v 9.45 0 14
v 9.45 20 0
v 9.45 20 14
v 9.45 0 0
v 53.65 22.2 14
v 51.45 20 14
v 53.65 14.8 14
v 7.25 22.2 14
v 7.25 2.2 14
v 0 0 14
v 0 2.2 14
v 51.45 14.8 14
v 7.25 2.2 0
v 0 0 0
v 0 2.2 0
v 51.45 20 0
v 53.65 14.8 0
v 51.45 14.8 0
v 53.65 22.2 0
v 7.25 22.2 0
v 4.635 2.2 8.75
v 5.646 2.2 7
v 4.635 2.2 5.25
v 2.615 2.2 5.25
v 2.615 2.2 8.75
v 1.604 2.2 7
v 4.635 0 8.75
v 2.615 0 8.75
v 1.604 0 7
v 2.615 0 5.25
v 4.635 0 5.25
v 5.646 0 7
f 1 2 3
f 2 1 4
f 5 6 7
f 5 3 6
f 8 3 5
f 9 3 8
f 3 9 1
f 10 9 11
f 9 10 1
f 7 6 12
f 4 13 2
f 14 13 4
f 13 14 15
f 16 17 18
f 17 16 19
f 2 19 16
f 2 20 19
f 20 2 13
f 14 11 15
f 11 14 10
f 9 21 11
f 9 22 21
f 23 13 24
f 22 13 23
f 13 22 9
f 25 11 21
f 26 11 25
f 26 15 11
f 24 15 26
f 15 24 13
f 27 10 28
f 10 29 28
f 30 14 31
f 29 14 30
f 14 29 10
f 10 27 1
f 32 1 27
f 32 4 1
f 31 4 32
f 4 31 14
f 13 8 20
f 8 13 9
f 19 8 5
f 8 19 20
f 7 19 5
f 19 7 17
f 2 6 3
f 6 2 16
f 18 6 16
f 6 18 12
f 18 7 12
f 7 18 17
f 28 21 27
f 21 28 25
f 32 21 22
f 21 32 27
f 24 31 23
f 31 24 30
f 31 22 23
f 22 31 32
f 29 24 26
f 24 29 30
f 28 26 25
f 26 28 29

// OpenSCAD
thickness=2.2;		//material thickness
top=42; 				//inside mesurement of top surface
height=20;			//inside measurement of height
width=14;			//width of bracket
twoscrews=false;	//screw on one side only if false
screw=3.5;			//diameter of screw hole
matlabs=false;		//prints pads to improve bed adhesion if matlabs=true
t_abspads=0.5;		//thickness abs pads
r_abspads=4;		//radius abs pads

flange=1.5*screw+thickness+2;


module frame()
{
cube([flange,thickness,width]);
translate ([flange-thickness,0,0]) cube([thickness,height+thickness,width]);
translate ([flange-thickness,height,0]) cube([top+2*thickness,thickness,width]);

if (twoscrews==true)
{
translate ([flange+top,0,0]) cube([thickness,height+thickness,width]);
translate ([flange+top,0,0]) cube([flange,thickness,width]);
}
else
translate ([flange+top,(height+thickness)/3*2,0]) cube([thickness,(height+thickness)/3,width]);


if (matlabs==true)
{
translate([0,thickness/2,0]) cylinder(t_abspads,r_abspads,r_abspads,$fn=60);
translate([flange-thickness,height+thickness/2,0]) cylinder(t_abspads,r_abspads,r_abspads,$fn=60);
translate([flange+top+thickness,height+thickness/2,0]) cylinder(t_abspads,r_abspads,r_abspads,$fn=60);
if (twoscrews==true)
translate([2*flange+top,thickness/2,0]) cylinder(t_abspads,r_abspads,r_abspads,$fn=60);
else
translate([flange+top+thickness/2,(height+thickness)/3*2,0]) cylinder(t_abspads,r_abspads,r_abspads,$fn=60);
}
}

module holes()
{
//hex holes will be undersized by cos(180/6) hence compensation included
translate ([(flange-thickness)/2,-0.1,width/2]) rotate([-90,0,0]) cylinder (thickness+0.2,screw/cos(180/6)/2,screw/cos(180/6)/2,$fn=6);
translate ([flange+top+thickness+(flange-thickness)/2,-0.1,width/2]) rotate([-90,0,0]) cylinder (thickness+0.2,screw/cos(180/6)/2,screw/cos(180/6)/2,$fn=6);
}

difference()
{
frame();
holes();
}
